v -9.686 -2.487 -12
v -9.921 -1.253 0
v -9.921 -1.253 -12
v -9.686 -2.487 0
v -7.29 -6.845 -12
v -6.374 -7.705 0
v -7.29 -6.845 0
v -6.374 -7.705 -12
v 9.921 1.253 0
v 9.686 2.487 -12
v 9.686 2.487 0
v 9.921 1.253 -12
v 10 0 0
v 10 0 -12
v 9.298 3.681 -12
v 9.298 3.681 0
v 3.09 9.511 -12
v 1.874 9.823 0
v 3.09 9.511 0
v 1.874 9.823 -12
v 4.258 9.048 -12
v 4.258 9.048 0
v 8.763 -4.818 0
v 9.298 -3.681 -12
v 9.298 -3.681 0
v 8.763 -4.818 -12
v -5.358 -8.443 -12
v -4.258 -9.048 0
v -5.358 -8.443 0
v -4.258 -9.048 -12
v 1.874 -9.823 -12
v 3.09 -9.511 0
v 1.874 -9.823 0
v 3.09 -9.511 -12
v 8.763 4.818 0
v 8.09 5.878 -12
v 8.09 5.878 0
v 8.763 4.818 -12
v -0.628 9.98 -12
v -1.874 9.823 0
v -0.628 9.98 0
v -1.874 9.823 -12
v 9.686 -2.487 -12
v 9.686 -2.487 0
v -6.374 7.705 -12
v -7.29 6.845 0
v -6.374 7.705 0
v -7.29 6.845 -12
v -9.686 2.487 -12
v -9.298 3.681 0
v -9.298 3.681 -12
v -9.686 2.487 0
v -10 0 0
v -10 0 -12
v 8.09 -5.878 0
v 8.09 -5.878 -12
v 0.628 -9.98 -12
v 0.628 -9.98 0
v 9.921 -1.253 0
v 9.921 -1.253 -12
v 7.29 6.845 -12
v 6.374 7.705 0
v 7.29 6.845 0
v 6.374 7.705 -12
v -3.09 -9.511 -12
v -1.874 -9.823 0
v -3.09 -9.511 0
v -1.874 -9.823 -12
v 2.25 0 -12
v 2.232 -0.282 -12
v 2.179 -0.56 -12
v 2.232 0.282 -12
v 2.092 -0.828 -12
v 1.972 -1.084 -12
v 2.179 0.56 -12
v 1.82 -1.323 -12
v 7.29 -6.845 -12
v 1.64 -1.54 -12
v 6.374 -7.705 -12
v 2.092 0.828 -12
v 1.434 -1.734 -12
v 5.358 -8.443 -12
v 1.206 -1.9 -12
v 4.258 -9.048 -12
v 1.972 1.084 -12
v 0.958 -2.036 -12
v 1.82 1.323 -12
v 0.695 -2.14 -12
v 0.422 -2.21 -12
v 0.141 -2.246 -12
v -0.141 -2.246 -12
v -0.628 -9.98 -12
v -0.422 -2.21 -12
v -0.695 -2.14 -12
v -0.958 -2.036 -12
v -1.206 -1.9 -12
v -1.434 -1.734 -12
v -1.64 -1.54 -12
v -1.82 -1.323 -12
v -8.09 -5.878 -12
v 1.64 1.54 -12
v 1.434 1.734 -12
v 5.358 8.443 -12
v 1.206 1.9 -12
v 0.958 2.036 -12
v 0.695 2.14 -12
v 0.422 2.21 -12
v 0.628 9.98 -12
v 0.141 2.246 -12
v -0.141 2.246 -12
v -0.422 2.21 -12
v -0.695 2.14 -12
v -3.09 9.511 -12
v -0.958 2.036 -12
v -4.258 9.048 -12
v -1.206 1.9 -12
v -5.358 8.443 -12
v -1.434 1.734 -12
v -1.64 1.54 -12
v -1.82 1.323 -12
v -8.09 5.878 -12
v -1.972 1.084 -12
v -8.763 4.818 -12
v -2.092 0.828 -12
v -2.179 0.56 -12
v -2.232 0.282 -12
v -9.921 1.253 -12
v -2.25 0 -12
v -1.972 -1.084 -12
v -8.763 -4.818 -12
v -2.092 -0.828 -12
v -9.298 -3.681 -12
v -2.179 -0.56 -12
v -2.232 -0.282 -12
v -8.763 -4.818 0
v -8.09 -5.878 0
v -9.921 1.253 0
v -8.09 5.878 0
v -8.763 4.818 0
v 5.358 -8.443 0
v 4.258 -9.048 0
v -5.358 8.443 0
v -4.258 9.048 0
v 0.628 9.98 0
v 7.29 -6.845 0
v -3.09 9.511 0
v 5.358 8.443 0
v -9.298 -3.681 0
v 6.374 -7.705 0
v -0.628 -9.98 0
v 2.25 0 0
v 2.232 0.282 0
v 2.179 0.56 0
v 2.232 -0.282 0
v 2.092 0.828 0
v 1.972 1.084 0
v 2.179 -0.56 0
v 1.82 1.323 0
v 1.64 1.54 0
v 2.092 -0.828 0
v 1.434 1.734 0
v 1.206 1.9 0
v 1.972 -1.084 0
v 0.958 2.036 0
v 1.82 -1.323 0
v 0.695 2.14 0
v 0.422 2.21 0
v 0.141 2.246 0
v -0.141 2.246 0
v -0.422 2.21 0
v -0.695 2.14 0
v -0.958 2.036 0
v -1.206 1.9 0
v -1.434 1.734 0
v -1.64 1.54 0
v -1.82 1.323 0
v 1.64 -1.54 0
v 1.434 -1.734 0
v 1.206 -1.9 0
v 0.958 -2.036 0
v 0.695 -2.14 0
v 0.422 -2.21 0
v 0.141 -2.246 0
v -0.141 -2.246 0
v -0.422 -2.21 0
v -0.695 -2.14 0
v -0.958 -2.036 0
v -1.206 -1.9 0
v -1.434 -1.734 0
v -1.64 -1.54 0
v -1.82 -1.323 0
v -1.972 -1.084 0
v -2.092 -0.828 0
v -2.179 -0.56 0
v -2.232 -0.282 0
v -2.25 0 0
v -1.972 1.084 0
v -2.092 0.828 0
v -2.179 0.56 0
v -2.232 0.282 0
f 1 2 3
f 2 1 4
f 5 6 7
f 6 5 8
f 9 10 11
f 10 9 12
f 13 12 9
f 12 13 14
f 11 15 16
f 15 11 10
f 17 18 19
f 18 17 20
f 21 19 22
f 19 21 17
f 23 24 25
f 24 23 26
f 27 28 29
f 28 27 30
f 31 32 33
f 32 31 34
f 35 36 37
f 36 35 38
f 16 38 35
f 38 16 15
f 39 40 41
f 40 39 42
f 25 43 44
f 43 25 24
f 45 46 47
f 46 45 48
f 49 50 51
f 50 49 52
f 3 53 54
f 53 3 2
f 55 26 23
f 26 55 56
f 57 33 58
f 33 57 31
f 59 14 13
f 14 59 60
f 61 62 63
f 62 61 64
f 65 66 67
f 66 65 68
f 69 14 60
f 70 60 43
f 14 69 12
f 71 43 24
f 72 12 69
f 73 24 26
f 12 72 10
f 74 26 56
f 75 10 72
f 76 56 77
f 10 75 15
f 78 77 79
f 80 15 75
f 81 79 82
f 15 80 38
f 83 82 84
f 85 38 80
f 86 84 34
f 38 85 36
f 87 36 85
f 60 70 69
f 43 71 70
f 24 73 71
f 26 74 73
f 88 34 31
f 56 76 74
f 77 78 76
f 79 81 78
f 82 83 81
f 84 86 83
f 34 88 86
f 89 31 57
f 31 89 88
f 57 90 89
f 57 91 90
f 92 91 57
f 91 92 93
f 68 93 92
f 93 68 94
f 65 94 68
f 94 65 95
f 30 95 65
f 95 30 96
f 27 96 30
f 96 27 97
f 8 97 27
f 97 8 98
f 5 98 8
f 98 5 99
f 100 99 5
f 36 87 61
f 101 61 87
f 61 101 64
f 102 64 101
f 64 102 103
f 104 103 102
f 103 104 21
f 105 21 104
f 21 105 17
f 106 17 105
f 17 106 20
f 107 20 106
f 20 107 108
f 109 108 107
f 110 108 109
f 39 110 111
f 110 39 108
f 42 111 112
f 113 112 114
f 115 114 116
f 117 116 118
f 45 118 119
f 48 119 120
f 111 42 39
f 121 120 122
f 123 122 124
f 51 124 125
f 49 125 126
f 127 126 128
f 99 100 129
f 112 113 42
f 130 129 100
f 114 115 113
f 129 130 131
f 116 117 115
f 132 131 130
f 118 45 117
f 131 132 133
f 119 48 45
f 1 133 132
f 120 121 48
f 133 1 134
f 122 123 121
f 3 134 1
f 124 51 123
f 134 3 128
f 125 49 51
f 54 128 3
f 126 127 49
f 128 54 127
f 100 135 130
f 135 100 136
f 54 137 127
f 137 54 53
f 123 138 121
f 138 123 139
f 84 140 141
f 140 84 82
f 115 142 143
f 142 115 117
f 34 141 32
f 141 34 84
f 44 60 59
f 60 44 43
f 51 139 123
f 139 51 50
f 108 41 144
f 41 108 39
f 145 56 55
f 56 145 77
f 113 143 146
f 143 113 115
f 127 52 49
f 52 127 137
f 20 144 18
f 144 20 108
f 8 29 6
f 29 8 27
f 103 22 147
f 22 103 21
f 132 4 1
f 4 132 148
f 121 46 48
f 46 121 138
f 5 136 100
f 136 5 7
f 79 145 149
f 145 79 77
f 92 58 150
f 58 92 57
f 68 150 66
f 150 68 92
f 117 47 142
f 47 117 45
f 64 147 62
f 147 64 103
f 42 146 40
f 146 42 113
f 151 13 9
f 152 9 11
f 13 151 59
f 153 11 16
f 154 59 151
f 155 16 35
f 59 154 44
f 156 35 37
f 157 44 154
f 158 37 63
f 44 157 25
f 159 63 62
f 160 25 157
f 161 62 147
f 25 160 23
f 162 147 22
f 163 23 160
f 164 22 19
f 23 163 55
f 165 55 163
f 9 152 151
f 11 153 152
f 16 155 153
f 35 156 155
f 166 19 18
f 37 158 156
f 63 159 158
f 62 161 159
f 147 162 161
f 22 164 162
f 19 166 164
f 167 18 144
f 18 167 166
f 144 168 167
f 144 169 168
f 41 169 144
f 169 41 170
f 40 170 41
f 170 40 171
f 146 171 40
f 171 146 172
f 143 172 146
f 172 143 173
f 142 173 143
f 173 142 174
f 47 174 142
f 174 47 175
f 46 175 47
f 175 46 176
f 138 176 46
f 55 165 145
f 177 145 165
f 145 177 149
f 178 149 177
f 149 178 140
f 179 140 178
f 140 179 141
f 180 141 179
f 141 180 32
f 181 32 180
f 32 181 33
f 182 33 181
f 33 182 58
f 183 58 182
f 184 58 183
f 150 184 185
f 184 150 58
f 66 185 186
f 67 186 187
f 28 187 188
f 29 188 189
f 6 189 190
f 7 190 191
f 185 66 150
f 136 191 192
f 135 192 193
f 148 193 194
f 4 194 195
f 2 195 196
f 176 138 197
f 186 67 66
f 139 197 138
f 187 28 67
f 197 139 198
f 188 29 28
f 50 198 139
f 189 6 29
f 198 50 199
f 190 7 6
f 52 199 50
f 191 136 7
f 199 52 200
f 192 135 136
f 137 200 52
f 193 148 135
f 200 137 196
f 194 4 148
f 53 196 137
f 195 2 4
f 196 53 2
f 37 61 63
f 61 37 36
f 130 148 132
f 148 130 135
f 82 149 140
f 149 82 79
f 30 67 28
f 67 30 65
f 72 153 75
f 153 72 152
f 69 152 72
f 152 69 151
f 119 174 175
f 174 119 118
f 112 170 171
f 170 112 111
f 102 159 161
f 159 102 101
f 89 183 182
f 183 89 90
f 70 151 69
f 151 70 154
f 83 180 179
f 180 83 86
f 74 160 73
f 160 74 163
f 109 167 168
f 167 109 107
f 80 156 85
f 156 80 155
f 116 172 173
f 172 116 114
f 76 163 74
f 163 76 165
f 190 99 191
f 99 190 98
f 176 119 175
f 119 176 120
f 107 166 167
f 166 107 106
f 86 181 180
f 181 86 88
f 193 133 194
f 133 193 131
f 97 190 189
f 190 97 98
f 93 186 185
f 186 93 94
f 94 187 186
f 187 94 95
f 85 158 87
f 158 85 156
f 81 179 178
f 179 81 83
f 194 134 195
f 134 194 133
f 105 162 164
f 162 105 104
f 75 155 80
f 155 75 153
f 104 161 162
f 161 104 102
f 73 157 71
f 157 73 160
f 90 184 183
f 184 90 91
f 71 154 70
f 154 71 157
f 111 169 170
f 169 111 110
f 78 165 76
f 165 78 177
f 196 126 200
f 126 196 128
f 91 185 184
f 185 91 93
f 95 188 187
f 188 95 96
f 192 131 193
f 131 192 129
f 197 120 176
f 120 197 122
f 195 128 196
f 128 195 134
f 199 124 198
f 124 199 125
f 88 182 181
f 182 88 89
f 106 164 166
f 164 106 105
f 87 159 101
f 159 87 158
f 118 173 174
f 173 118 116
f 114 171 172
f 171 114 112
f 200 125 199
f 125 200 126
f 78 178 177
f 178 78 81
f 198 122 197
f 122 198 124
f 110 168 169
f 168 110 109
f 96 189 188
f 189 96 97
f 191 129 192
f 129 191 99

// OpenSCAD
$fn = 50;


difference() {
	union() {
		translate(v = [0, 0, -12.0000000000]) {
			cylinder(h = 12, r = 10.0000000000);
		}
		cylinder(h = 0, r = 19.0000000000);
	}
	union() {
		#translate(v = [0, 0, -12]) {
			cylinder(h = 12, r = 2.2500000000);
		}
	}
}
